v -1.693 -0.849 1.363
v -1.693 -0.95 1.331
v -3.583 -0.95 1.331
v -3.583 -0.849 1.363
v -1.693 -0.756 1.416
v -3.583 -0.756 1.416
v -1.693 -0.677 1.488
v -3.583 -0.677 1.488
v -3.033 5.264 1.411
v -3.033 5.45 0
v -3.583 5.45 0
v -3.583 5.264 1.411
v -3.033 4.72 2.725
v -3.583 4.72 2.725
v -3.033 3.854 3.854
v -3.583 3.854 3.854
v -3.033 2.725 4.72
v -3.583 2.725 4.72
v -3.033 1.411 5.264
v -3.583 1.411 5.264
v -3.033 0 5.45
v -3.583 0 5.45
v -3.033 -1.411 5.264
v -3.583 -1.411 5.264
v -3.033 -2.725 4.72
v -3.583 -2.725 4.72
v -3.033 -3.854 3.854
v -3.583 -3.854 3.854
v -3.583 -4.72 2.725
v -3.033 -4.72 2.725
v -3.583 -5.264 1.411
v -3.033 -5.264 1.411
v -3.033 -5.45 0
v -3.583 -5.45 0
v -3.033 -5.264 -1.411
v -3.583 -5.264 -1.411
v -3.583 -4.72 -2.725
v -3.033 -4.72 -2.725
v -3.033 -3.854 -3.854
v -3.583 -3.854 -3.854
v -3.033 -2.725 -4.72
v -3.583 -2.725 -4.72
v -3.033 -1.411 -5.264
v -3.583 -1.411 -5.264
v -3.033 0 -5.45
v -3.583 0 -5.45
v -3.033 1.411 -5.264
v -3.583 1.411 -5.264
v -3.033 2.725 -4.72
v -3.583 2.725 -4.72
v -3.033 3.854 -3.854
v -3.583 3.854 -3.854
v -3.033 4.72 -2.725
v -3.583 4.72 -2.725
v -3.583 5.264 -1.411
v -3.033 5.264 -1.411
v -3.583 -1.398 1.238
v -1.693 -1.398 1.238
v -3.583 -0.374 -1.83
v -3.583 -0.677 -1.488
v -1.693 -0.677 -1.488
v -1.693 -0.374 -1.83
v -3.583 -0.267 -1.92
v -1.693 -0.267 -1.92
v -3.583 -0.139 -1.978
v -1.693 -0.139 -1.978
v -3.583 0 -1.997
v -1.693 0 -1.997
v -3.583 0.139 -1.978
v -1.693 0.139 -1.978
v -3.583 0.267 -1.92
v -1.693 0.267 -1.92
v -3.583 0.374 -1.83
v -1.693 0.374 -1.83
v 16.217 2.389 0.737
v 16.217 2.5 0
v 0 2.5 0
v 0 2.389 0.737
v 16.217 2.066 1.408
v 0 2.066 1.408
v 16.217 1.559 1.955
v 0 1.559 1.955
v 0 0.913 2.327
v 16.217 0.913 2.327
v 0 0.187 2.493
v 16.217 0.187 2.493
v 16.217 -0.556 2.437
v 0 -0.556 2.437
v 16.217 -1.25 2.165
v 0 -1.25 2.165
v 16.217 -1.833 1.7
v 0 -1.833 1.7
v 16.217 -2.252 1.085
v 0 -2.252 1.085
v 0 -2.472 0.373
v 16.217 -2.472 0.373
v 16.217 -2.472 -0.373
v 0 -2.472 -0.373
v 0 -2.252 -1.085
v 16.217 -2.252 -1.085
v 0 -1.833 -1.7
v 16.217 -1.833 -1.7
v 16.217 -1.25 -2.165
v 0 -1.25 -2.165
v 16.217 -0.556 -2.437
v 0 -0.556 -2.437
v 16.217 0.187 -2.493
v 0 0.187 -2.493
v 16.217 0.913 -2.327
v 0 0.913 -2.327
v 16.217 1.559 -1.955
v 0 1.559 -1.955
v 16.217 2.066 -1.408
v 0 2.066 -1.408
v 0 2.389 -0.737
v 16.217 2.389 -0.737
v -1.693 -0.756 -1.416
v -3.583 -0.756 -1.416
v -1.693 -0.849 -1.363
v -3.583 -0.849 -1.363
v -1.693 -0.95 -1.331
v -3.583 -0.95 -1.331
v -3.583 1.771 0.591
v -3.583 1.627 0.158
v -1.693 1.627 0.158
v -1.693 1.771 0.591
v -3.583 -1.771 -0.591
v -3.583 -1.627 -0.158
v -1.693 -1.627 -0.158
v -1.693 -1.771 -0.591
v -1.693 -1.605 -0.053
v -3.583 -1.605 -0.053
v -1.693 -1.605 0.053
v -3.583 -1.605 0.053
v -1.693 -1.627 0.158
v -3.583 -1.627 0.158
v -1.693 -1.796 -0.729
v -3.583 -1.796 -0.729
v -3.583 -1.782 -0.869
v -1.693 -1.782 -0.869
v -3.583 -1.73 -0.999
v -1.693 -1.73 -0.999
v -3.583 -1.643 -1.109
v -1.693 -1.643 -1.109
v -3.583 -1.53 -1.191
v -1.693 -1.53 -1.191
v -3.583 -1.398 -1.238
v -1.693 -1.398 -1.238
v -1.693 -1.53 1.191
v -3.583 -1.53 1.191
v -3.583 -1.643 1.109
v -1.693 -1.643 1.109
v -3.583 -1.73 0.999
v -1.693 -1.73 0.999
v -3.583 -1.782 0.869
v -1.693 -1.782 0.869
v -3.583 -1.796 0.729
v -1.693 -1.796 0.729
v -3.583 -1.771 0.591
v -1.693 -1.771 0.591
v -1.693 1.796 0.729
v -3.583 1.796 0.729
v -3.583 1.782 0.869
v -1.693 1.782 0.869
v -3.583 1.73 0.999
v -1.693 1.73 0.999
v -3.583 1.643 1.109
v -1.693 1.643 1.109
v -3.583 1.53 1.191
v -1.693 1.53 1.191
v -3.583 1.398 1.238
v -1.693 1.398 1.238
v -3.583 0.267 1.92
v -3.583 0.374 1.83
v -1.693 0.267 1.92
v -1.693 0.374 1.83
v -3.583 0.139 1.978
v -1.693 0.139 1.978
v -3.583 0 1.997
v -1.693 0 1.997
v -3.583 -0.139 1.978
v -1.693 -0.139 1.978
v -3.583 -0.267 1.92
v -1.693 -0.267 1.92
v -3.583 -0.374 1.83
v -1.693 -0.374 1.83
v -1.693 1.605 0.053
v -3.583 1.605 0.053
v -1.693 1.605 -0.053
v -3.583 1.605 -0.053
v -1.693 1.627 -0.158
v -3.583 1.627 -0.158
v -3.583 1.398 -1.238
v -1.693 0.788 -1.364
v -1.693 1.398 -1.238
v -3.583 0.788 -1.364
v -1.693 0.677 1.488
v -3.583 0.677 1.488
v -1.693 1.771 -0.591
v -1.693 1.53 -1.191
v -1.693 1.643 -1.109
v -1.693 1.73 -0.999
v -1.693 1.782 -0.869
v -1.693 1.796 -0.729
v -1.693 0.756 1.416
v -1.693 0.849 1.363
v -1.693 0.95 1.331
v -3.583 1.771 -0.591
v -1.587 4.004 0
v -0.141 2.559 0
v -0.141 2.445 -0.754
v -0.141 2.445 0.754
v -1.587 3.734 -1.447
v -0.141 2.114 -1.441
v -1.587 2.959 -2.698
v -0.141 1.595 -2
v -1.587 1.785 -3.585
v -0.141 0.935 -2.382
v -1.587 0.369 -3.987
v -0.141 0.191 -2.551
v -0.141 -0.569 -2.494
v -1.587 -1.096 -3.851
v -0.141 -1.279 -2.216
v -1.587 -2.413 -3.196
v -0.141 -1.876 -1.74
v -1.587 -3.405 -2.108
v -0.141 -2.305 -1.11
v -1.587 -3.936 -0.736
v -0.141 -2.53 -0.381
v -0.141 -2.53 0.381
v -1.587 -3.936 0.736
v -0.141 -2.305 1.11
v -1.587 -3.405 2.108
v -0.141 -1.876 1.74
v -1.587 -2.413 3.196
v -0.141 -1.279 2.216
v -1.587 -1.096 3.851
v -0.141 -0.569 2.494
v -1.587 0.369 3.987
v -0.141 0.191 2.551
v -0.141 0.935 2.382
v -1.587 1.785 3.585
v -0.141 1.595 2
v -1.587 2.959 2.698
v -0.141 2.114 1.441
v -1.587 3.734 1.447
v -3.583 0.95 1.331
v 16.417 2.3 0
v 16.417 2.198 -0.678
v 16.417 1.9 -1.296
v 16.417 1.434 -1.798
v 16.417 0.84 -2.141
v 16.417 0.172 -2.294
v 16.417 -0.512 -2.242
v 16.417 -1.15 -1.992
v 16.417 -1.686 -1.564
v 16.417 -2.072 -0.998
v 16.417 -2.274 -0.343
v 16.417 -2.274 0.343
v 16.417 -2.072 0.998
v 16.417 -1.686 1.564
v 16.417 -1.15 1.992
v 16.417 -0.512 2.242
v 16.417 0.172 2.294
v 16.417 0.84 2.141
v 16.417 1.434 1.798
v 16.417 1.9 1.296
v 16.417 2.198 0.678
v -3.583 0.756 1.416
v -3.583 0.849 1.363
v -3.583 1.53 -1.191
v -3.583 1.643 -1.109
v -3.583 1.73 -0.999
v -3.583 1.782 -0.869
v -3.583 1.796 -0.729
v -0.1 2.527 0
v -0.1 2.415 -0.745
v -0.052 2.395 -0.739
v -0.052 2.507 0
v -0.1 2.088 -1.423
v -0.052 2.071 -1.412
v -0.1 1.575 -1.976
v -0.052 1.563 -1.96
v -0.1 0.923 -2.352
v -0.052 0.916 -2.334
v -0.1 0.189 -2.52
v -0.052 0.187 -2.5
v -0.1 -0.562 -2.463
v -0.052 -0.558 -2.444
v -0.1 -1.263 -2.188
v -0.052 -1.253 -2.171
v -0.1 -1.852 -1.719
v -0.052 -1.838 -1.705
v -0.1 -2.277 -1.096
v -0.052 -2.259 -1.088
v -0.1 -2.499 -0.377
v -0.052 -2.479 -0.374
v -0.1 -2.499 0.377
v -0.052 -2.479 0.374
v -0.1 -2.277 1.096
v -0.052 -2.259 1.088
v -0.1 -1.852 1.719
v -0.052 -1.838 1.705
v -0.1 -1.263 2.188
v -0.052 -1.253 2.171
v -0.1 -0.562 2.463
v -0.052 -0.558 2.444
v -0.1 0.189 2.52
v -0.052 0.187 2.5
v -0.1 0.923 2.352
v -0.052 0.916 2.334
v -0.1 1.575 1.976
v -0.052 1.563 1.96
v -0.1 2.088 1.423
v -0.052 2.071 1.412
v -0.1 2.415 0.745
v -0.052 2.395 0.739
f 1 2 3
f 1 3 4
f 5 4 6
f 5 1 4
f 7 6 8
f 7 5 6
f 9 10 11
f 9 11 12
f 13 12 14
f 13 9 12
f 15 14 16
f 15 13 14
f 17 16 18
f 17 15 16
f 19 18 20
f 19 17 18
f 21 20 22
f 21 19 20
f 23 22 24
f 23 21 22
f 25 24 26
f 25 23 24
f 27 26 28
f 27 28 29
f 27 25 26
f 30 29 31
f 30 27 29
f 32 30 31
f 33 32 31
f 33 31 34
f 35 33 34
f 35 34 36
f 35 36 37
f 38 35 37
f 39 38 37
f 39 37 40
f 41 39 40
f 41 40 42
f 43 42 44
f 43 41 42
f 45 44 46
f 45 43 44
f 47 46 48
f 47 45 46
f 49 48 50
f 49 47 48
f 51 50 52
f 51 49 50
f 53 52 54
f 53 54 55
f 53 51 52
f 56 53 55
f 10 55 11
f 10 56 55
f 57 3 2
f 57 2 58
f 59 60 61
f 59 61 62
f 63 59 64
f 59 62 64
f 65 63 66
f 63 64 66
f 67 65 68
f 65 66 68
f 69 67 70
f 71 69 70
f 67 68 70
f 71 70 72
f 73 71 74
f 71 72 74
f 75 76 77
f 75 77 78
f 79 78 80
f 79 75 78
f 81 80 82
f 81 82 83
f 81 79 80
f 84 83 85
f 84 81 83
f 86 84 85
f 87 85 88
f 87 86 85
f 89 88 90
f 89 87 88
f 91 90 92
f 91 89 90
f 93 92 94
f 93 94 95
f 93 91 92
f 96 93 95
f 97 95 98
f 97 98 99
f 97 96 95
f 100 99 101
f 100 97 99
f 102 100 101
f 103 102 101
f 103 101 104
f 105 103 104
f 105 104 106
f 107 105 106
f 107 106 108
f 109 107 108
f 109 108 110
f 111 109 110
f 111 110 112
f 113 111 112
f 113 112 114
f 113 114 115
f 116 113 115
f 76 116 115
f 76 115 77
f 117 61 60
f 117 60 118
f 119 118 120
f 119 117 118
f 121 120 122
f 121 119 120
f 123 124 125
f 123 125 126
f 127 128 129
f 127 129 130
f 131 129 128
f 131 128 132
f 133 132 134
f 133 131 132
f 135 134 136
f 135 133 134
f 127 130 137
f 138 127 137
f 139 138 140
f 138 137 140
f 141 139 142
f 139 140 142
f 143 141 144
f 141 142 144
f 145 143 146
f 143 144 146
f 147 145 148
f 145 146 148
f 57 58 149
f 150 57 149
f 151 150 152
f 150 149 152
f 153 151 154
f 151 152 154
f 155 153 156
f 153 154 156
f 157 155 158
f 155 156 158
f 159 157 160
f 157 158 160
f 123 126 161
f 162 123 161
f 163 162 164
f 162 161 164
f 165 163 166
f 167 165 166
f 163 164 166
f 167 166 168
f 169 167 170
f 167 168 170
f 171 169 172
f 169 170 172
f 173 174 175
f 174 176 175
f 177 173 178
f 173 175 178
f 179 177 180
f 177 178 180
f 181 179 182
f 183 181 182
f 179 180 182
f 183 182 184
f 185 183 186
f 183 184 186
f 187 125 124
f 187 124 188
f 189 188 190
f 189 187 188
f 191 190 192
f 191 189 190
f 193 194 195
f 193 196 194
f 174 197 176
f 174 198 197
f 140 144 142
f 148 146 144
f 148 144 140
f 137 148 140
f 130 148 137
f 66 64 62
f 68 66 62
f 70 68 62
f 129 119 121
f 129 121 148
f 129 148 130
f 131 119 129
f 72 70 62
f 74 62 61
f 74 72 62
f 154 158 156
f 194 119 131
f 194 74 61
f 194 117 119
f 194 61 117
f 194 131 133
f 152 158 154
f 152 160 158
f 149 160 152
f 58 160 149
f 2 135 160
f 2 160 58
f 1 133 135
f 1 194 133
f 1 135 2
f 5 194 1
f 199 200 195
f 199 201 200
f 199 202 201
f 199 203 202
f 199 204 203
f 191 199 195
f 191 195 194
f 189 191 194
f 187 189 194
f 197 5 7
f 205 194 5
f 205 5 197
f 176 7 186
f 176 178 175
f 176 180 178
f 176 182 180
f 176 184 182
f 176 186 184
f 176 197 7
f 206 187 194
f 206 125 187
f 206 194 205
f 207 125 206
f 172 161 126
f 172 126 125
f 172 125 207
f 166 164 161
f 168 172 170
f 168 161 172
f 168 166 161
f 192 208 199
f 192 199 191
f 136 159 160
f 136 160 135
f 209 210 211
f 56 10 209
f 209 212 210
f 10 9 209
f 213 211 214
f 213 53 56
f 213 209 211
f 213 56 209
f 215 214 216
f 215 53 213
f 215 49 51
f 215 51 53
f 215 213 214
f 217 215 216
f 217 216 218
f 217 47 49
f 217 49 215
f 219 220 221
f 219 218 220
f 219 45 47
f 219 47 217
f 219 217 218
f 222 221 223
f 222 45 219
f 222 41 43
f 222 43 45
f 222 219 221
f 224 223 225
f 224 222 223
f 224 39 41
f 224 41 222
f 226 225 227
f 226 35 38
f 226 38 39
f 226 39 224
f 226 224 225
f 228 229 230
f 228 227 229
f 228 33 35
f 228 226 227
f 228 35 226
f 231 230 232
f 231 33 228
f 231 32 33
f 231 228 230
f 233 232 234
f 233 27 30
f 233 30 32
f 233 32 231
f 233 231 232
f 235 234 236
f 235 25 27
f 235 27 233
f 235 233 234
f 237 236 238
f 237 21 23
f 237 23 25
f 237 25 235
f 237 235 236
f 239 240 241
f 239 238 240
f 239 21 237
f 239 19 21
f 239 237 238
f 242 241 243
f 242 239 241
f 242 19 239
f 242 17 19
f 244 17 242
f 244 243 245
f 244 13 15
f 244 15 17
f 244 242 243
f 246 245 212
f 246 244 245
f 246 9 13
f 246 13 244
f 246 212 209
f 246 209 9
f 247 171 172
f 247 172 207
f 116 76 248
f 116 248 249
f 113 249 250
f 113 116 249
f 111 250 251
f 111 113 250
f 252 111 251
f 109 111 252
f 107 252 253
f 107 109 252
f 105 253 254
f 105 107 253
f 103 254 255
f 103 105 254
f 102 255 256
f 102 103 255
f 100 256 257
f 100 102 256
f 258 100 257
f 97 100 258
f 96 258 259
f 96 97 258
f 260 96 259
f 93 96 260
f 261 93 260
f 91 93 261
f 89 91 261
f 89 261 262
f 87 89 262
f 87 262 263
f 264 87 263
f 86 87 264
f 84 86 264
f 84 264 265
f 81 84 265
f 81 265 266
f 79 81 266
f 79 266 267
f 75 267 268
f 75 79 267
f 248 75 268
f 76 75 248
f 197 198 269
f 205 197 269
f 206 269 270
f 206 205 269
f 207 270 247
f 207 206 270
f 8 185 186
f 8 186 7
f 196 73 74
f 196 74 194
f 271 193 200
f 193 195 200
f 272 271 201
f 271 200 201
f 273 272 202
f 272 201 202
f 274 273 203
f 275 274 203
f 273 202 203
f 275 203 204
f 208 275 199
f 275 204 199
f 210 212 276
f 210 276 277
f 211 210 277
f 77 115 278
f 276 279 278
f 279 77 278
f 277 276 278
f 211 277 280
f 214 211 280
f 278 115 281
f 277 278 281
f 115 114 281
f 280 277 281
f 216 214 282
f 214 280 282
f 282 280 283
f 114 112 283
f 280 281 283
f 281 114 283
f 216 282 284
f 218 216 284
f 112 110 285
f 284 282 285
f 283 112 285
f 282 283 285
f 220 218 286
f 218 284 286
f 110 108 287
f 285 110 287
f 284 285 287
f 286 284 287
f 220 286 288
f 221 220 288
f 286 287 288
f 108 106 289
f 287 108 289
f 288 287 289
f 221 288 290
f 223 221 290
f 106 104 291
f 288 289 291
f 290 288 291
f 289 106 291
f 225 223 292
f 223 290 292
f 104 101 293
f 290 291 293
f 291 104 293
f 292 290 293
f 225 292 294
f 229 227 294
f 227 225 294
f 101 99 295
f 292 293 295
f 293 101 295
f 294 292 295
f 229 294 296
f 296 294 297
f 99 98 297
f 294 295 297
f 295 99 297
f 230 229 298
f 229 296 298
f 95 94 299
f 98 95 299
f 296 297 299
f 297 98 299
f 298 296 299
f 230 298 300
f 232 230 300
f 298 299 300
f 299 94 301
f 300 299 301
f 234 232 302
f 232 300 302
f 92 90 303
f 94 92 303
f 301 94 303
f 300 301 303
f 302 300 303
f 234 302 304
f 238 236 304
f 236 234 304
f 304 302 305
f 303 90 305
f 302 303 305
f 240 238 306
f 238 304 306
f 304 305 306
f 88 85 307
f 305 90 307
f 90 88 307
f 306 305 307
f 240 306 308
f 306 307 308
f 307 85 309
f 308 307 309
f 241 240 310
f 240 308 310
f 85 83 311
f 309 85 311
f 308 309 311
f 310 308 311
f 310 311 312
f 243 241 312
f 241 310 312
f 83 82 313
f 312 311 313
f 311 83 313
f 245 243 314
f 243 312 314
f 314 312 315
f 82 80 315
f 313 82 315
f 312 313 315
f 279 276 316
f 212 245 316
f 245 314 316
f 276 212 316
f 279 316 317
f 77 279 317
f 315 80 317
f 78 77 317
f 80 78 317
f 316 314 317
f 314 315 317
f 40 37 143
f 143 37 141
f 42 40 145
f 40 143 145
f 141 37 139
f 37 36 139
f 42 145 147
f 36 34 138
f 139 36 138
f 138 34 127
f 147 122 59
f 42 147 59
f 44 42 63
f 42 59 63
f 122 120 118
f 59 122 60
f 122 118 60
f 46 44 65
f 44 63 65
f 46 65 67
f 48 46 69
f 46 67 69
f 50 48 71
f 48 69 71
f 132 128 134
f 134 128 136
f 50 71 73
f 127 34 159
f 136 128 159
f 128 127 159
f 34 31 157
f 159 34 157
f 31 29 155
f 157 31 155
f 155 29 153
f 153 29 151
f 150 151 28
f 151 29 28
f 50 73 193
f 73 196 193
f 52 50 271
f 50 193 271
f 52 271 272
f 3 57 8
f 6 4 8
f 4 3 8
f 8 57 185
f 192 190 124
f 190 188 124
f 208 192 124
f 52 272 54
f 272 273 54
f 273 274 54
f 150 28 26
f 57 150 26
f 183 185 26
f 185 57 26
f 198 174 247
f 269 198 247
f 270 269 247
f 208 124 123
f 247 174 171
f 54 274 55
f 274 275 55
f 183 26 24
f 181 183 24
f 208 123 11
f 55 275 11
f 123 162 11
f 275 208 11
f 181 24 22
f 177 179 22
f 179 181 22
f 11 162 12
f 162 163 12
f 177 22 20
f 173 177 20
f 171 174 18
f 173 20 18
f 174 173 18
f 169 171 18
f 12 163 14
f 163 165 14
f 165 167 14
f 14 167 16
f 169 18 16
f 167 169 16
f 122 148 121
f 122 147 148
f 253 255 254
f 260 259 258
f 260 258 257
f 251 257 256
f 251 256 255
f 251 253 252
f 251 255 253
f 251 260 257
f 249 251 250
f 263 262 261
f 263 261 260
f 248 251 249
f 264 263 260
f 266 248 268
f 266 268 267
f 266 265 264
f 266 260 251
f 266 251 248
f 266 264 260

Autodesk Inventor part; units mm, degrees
ref_plane "YZ Plane" through (0, 0, 0) normal (1, 0, 0) x (0, 1, 0)
ref_plane "XZ Plane" through (0, 0, 0) normal (0, 1, 0) x (-1, 0, 0)
ref_plane "XY Plane" through (0, 0, 0) normal (0, 0, 1) x (1, 0, 0)
sketch "Sketch1" plane through (0, 0, 0) normal (0, 0, 1) x (1, 0, 0)
  line L0 (16.4172, 2.5) -> (16.4172, 0)
  line L1 (-3.5828, 5.45) -> (-3.5828, 0)
  line L2 (-3.5828, 0) -> (16.4172, 0)
  line L3 (-4.3037, 0) -> (7.1102, 0)
  line L4 (-3.0328, 5.45) -> (-0.1414, 2.5586)
  line L5 (-3.5828, 5.45) -> (-3.0328, 5.45)
  line L6 (0, 2.5) -> (16.4172, 2.5)
  arc A0 (-0.1414, 2.5586) -> (0, 2.5) centre (0, 2.7) ccw
  line L7 (0, 2.5) -> (0, 0)
  point P0 (-0.0828, 2.5)
  dimension "d2" = 20
  dimension "d52" = 45
  dimension "d57" = 3.5
  dimension "d58" = 90
  dimension "d60" = 10.9
  dimension "d61" = 0.2
  dimension "d62" = 5
revolve "Revolution1" add sketch "Sketch1" angle 360 about axis through (-4.3037, 0, 0) along (1, 0, 0)
thread "Thread1" size "M5x0.8" class "6g" standard "ISO Metric profile" length 16.3
chamfer "Chamfer1" distance 0.2 angle 45 1 edges at (16.4172, -2.5, 0)
sketch "Sketch2" plane through (-3.5828, 0, 0) normal (-1, 0, 0) x (0, 0, 1)
  circle A0 centre (0, 0) radius 2.25 construction
  circle A1 centre (0, 0) radius 1.575 construction
  line L0 (2.6829, 0) -> (-1.3062, 0) construction
  line L1 (0, 0) -> (1.364, 0.7875)
  line L2 (0, 0) -> (1.364, -0.7875)
  line L3 (1.364, 0.7875) -> (2.25, 0)
  line L4 (2.25, 0) -> (1.364, -0.7875)
  point P0 (0, 0)
  dimension "d17" = 4.5
  dimension "d18" = 3.15
  dimension "d19" = 30
  dimension "d20" = 30
  dimension "d21" = 83.262
extrude "Extrusion1" cut sketch "Sketch2" against normal blind 1.89
pattern_circular "Circular Pattern1" count 6 over 360 about axis through (-10, 0, 0) along (1, 0, 0) of "Extrusion1"
fillet "Fillet1" radius 0.5 11 edges at (-2.6378, 0.7875, 1.364) (-2.6378, -0.7875, 1.364) (-2.6378, -1.575, 0) (-2.6378, 0, 2.25) (-2.6378, 1.575, 0) (-2.6378, -0.7875, -1.364) (-2.6378, 0, -2.25) (-2.6378, -1.9486, 1.125) (-2.6378, -1.9486, -1.125) (-2.6378, 1.9486, -1.125) (-2.6378, 1.9486, 1.125)
equation "\"d2\" = l_"
equation "\"d52\" = 0.5 * headAngle"
equation "\"d57\" = k"
equation "\"d60\" = dk"
equation "\"d61\" = r"
equation "\"d62\" = d_"
equation "\"d12\" = thredlenght"
equation "\"d17\" = A_"
equation "\"d18\" = 0.7 * A_"
equation "\"d22\" = t"
equation "\"d27\" = 0.1 * d_"
equation "\"p\" = 0.5"
equation "\"dk\" = 10.9"
equation "\"d_\" = 5"
equation "\"k\" = 3.5"
equation "\"r\" = 0.2"
equation "\"A_\" = 4.5"
equation "\"t\" = 1.89"
equation "\"l_\" = 20"
equation "\"lg\" = r + k"
equation "\"shldr\" = p"
equation "\"headAngle\" = 90deg"
equation "\"d53_Copy\" = 1.938"
equation "\"thredlenght\" = l_ - lg"
properties part number "Countersunk head screw ISO 14582 - M5x20-10.9" material "Steel"
